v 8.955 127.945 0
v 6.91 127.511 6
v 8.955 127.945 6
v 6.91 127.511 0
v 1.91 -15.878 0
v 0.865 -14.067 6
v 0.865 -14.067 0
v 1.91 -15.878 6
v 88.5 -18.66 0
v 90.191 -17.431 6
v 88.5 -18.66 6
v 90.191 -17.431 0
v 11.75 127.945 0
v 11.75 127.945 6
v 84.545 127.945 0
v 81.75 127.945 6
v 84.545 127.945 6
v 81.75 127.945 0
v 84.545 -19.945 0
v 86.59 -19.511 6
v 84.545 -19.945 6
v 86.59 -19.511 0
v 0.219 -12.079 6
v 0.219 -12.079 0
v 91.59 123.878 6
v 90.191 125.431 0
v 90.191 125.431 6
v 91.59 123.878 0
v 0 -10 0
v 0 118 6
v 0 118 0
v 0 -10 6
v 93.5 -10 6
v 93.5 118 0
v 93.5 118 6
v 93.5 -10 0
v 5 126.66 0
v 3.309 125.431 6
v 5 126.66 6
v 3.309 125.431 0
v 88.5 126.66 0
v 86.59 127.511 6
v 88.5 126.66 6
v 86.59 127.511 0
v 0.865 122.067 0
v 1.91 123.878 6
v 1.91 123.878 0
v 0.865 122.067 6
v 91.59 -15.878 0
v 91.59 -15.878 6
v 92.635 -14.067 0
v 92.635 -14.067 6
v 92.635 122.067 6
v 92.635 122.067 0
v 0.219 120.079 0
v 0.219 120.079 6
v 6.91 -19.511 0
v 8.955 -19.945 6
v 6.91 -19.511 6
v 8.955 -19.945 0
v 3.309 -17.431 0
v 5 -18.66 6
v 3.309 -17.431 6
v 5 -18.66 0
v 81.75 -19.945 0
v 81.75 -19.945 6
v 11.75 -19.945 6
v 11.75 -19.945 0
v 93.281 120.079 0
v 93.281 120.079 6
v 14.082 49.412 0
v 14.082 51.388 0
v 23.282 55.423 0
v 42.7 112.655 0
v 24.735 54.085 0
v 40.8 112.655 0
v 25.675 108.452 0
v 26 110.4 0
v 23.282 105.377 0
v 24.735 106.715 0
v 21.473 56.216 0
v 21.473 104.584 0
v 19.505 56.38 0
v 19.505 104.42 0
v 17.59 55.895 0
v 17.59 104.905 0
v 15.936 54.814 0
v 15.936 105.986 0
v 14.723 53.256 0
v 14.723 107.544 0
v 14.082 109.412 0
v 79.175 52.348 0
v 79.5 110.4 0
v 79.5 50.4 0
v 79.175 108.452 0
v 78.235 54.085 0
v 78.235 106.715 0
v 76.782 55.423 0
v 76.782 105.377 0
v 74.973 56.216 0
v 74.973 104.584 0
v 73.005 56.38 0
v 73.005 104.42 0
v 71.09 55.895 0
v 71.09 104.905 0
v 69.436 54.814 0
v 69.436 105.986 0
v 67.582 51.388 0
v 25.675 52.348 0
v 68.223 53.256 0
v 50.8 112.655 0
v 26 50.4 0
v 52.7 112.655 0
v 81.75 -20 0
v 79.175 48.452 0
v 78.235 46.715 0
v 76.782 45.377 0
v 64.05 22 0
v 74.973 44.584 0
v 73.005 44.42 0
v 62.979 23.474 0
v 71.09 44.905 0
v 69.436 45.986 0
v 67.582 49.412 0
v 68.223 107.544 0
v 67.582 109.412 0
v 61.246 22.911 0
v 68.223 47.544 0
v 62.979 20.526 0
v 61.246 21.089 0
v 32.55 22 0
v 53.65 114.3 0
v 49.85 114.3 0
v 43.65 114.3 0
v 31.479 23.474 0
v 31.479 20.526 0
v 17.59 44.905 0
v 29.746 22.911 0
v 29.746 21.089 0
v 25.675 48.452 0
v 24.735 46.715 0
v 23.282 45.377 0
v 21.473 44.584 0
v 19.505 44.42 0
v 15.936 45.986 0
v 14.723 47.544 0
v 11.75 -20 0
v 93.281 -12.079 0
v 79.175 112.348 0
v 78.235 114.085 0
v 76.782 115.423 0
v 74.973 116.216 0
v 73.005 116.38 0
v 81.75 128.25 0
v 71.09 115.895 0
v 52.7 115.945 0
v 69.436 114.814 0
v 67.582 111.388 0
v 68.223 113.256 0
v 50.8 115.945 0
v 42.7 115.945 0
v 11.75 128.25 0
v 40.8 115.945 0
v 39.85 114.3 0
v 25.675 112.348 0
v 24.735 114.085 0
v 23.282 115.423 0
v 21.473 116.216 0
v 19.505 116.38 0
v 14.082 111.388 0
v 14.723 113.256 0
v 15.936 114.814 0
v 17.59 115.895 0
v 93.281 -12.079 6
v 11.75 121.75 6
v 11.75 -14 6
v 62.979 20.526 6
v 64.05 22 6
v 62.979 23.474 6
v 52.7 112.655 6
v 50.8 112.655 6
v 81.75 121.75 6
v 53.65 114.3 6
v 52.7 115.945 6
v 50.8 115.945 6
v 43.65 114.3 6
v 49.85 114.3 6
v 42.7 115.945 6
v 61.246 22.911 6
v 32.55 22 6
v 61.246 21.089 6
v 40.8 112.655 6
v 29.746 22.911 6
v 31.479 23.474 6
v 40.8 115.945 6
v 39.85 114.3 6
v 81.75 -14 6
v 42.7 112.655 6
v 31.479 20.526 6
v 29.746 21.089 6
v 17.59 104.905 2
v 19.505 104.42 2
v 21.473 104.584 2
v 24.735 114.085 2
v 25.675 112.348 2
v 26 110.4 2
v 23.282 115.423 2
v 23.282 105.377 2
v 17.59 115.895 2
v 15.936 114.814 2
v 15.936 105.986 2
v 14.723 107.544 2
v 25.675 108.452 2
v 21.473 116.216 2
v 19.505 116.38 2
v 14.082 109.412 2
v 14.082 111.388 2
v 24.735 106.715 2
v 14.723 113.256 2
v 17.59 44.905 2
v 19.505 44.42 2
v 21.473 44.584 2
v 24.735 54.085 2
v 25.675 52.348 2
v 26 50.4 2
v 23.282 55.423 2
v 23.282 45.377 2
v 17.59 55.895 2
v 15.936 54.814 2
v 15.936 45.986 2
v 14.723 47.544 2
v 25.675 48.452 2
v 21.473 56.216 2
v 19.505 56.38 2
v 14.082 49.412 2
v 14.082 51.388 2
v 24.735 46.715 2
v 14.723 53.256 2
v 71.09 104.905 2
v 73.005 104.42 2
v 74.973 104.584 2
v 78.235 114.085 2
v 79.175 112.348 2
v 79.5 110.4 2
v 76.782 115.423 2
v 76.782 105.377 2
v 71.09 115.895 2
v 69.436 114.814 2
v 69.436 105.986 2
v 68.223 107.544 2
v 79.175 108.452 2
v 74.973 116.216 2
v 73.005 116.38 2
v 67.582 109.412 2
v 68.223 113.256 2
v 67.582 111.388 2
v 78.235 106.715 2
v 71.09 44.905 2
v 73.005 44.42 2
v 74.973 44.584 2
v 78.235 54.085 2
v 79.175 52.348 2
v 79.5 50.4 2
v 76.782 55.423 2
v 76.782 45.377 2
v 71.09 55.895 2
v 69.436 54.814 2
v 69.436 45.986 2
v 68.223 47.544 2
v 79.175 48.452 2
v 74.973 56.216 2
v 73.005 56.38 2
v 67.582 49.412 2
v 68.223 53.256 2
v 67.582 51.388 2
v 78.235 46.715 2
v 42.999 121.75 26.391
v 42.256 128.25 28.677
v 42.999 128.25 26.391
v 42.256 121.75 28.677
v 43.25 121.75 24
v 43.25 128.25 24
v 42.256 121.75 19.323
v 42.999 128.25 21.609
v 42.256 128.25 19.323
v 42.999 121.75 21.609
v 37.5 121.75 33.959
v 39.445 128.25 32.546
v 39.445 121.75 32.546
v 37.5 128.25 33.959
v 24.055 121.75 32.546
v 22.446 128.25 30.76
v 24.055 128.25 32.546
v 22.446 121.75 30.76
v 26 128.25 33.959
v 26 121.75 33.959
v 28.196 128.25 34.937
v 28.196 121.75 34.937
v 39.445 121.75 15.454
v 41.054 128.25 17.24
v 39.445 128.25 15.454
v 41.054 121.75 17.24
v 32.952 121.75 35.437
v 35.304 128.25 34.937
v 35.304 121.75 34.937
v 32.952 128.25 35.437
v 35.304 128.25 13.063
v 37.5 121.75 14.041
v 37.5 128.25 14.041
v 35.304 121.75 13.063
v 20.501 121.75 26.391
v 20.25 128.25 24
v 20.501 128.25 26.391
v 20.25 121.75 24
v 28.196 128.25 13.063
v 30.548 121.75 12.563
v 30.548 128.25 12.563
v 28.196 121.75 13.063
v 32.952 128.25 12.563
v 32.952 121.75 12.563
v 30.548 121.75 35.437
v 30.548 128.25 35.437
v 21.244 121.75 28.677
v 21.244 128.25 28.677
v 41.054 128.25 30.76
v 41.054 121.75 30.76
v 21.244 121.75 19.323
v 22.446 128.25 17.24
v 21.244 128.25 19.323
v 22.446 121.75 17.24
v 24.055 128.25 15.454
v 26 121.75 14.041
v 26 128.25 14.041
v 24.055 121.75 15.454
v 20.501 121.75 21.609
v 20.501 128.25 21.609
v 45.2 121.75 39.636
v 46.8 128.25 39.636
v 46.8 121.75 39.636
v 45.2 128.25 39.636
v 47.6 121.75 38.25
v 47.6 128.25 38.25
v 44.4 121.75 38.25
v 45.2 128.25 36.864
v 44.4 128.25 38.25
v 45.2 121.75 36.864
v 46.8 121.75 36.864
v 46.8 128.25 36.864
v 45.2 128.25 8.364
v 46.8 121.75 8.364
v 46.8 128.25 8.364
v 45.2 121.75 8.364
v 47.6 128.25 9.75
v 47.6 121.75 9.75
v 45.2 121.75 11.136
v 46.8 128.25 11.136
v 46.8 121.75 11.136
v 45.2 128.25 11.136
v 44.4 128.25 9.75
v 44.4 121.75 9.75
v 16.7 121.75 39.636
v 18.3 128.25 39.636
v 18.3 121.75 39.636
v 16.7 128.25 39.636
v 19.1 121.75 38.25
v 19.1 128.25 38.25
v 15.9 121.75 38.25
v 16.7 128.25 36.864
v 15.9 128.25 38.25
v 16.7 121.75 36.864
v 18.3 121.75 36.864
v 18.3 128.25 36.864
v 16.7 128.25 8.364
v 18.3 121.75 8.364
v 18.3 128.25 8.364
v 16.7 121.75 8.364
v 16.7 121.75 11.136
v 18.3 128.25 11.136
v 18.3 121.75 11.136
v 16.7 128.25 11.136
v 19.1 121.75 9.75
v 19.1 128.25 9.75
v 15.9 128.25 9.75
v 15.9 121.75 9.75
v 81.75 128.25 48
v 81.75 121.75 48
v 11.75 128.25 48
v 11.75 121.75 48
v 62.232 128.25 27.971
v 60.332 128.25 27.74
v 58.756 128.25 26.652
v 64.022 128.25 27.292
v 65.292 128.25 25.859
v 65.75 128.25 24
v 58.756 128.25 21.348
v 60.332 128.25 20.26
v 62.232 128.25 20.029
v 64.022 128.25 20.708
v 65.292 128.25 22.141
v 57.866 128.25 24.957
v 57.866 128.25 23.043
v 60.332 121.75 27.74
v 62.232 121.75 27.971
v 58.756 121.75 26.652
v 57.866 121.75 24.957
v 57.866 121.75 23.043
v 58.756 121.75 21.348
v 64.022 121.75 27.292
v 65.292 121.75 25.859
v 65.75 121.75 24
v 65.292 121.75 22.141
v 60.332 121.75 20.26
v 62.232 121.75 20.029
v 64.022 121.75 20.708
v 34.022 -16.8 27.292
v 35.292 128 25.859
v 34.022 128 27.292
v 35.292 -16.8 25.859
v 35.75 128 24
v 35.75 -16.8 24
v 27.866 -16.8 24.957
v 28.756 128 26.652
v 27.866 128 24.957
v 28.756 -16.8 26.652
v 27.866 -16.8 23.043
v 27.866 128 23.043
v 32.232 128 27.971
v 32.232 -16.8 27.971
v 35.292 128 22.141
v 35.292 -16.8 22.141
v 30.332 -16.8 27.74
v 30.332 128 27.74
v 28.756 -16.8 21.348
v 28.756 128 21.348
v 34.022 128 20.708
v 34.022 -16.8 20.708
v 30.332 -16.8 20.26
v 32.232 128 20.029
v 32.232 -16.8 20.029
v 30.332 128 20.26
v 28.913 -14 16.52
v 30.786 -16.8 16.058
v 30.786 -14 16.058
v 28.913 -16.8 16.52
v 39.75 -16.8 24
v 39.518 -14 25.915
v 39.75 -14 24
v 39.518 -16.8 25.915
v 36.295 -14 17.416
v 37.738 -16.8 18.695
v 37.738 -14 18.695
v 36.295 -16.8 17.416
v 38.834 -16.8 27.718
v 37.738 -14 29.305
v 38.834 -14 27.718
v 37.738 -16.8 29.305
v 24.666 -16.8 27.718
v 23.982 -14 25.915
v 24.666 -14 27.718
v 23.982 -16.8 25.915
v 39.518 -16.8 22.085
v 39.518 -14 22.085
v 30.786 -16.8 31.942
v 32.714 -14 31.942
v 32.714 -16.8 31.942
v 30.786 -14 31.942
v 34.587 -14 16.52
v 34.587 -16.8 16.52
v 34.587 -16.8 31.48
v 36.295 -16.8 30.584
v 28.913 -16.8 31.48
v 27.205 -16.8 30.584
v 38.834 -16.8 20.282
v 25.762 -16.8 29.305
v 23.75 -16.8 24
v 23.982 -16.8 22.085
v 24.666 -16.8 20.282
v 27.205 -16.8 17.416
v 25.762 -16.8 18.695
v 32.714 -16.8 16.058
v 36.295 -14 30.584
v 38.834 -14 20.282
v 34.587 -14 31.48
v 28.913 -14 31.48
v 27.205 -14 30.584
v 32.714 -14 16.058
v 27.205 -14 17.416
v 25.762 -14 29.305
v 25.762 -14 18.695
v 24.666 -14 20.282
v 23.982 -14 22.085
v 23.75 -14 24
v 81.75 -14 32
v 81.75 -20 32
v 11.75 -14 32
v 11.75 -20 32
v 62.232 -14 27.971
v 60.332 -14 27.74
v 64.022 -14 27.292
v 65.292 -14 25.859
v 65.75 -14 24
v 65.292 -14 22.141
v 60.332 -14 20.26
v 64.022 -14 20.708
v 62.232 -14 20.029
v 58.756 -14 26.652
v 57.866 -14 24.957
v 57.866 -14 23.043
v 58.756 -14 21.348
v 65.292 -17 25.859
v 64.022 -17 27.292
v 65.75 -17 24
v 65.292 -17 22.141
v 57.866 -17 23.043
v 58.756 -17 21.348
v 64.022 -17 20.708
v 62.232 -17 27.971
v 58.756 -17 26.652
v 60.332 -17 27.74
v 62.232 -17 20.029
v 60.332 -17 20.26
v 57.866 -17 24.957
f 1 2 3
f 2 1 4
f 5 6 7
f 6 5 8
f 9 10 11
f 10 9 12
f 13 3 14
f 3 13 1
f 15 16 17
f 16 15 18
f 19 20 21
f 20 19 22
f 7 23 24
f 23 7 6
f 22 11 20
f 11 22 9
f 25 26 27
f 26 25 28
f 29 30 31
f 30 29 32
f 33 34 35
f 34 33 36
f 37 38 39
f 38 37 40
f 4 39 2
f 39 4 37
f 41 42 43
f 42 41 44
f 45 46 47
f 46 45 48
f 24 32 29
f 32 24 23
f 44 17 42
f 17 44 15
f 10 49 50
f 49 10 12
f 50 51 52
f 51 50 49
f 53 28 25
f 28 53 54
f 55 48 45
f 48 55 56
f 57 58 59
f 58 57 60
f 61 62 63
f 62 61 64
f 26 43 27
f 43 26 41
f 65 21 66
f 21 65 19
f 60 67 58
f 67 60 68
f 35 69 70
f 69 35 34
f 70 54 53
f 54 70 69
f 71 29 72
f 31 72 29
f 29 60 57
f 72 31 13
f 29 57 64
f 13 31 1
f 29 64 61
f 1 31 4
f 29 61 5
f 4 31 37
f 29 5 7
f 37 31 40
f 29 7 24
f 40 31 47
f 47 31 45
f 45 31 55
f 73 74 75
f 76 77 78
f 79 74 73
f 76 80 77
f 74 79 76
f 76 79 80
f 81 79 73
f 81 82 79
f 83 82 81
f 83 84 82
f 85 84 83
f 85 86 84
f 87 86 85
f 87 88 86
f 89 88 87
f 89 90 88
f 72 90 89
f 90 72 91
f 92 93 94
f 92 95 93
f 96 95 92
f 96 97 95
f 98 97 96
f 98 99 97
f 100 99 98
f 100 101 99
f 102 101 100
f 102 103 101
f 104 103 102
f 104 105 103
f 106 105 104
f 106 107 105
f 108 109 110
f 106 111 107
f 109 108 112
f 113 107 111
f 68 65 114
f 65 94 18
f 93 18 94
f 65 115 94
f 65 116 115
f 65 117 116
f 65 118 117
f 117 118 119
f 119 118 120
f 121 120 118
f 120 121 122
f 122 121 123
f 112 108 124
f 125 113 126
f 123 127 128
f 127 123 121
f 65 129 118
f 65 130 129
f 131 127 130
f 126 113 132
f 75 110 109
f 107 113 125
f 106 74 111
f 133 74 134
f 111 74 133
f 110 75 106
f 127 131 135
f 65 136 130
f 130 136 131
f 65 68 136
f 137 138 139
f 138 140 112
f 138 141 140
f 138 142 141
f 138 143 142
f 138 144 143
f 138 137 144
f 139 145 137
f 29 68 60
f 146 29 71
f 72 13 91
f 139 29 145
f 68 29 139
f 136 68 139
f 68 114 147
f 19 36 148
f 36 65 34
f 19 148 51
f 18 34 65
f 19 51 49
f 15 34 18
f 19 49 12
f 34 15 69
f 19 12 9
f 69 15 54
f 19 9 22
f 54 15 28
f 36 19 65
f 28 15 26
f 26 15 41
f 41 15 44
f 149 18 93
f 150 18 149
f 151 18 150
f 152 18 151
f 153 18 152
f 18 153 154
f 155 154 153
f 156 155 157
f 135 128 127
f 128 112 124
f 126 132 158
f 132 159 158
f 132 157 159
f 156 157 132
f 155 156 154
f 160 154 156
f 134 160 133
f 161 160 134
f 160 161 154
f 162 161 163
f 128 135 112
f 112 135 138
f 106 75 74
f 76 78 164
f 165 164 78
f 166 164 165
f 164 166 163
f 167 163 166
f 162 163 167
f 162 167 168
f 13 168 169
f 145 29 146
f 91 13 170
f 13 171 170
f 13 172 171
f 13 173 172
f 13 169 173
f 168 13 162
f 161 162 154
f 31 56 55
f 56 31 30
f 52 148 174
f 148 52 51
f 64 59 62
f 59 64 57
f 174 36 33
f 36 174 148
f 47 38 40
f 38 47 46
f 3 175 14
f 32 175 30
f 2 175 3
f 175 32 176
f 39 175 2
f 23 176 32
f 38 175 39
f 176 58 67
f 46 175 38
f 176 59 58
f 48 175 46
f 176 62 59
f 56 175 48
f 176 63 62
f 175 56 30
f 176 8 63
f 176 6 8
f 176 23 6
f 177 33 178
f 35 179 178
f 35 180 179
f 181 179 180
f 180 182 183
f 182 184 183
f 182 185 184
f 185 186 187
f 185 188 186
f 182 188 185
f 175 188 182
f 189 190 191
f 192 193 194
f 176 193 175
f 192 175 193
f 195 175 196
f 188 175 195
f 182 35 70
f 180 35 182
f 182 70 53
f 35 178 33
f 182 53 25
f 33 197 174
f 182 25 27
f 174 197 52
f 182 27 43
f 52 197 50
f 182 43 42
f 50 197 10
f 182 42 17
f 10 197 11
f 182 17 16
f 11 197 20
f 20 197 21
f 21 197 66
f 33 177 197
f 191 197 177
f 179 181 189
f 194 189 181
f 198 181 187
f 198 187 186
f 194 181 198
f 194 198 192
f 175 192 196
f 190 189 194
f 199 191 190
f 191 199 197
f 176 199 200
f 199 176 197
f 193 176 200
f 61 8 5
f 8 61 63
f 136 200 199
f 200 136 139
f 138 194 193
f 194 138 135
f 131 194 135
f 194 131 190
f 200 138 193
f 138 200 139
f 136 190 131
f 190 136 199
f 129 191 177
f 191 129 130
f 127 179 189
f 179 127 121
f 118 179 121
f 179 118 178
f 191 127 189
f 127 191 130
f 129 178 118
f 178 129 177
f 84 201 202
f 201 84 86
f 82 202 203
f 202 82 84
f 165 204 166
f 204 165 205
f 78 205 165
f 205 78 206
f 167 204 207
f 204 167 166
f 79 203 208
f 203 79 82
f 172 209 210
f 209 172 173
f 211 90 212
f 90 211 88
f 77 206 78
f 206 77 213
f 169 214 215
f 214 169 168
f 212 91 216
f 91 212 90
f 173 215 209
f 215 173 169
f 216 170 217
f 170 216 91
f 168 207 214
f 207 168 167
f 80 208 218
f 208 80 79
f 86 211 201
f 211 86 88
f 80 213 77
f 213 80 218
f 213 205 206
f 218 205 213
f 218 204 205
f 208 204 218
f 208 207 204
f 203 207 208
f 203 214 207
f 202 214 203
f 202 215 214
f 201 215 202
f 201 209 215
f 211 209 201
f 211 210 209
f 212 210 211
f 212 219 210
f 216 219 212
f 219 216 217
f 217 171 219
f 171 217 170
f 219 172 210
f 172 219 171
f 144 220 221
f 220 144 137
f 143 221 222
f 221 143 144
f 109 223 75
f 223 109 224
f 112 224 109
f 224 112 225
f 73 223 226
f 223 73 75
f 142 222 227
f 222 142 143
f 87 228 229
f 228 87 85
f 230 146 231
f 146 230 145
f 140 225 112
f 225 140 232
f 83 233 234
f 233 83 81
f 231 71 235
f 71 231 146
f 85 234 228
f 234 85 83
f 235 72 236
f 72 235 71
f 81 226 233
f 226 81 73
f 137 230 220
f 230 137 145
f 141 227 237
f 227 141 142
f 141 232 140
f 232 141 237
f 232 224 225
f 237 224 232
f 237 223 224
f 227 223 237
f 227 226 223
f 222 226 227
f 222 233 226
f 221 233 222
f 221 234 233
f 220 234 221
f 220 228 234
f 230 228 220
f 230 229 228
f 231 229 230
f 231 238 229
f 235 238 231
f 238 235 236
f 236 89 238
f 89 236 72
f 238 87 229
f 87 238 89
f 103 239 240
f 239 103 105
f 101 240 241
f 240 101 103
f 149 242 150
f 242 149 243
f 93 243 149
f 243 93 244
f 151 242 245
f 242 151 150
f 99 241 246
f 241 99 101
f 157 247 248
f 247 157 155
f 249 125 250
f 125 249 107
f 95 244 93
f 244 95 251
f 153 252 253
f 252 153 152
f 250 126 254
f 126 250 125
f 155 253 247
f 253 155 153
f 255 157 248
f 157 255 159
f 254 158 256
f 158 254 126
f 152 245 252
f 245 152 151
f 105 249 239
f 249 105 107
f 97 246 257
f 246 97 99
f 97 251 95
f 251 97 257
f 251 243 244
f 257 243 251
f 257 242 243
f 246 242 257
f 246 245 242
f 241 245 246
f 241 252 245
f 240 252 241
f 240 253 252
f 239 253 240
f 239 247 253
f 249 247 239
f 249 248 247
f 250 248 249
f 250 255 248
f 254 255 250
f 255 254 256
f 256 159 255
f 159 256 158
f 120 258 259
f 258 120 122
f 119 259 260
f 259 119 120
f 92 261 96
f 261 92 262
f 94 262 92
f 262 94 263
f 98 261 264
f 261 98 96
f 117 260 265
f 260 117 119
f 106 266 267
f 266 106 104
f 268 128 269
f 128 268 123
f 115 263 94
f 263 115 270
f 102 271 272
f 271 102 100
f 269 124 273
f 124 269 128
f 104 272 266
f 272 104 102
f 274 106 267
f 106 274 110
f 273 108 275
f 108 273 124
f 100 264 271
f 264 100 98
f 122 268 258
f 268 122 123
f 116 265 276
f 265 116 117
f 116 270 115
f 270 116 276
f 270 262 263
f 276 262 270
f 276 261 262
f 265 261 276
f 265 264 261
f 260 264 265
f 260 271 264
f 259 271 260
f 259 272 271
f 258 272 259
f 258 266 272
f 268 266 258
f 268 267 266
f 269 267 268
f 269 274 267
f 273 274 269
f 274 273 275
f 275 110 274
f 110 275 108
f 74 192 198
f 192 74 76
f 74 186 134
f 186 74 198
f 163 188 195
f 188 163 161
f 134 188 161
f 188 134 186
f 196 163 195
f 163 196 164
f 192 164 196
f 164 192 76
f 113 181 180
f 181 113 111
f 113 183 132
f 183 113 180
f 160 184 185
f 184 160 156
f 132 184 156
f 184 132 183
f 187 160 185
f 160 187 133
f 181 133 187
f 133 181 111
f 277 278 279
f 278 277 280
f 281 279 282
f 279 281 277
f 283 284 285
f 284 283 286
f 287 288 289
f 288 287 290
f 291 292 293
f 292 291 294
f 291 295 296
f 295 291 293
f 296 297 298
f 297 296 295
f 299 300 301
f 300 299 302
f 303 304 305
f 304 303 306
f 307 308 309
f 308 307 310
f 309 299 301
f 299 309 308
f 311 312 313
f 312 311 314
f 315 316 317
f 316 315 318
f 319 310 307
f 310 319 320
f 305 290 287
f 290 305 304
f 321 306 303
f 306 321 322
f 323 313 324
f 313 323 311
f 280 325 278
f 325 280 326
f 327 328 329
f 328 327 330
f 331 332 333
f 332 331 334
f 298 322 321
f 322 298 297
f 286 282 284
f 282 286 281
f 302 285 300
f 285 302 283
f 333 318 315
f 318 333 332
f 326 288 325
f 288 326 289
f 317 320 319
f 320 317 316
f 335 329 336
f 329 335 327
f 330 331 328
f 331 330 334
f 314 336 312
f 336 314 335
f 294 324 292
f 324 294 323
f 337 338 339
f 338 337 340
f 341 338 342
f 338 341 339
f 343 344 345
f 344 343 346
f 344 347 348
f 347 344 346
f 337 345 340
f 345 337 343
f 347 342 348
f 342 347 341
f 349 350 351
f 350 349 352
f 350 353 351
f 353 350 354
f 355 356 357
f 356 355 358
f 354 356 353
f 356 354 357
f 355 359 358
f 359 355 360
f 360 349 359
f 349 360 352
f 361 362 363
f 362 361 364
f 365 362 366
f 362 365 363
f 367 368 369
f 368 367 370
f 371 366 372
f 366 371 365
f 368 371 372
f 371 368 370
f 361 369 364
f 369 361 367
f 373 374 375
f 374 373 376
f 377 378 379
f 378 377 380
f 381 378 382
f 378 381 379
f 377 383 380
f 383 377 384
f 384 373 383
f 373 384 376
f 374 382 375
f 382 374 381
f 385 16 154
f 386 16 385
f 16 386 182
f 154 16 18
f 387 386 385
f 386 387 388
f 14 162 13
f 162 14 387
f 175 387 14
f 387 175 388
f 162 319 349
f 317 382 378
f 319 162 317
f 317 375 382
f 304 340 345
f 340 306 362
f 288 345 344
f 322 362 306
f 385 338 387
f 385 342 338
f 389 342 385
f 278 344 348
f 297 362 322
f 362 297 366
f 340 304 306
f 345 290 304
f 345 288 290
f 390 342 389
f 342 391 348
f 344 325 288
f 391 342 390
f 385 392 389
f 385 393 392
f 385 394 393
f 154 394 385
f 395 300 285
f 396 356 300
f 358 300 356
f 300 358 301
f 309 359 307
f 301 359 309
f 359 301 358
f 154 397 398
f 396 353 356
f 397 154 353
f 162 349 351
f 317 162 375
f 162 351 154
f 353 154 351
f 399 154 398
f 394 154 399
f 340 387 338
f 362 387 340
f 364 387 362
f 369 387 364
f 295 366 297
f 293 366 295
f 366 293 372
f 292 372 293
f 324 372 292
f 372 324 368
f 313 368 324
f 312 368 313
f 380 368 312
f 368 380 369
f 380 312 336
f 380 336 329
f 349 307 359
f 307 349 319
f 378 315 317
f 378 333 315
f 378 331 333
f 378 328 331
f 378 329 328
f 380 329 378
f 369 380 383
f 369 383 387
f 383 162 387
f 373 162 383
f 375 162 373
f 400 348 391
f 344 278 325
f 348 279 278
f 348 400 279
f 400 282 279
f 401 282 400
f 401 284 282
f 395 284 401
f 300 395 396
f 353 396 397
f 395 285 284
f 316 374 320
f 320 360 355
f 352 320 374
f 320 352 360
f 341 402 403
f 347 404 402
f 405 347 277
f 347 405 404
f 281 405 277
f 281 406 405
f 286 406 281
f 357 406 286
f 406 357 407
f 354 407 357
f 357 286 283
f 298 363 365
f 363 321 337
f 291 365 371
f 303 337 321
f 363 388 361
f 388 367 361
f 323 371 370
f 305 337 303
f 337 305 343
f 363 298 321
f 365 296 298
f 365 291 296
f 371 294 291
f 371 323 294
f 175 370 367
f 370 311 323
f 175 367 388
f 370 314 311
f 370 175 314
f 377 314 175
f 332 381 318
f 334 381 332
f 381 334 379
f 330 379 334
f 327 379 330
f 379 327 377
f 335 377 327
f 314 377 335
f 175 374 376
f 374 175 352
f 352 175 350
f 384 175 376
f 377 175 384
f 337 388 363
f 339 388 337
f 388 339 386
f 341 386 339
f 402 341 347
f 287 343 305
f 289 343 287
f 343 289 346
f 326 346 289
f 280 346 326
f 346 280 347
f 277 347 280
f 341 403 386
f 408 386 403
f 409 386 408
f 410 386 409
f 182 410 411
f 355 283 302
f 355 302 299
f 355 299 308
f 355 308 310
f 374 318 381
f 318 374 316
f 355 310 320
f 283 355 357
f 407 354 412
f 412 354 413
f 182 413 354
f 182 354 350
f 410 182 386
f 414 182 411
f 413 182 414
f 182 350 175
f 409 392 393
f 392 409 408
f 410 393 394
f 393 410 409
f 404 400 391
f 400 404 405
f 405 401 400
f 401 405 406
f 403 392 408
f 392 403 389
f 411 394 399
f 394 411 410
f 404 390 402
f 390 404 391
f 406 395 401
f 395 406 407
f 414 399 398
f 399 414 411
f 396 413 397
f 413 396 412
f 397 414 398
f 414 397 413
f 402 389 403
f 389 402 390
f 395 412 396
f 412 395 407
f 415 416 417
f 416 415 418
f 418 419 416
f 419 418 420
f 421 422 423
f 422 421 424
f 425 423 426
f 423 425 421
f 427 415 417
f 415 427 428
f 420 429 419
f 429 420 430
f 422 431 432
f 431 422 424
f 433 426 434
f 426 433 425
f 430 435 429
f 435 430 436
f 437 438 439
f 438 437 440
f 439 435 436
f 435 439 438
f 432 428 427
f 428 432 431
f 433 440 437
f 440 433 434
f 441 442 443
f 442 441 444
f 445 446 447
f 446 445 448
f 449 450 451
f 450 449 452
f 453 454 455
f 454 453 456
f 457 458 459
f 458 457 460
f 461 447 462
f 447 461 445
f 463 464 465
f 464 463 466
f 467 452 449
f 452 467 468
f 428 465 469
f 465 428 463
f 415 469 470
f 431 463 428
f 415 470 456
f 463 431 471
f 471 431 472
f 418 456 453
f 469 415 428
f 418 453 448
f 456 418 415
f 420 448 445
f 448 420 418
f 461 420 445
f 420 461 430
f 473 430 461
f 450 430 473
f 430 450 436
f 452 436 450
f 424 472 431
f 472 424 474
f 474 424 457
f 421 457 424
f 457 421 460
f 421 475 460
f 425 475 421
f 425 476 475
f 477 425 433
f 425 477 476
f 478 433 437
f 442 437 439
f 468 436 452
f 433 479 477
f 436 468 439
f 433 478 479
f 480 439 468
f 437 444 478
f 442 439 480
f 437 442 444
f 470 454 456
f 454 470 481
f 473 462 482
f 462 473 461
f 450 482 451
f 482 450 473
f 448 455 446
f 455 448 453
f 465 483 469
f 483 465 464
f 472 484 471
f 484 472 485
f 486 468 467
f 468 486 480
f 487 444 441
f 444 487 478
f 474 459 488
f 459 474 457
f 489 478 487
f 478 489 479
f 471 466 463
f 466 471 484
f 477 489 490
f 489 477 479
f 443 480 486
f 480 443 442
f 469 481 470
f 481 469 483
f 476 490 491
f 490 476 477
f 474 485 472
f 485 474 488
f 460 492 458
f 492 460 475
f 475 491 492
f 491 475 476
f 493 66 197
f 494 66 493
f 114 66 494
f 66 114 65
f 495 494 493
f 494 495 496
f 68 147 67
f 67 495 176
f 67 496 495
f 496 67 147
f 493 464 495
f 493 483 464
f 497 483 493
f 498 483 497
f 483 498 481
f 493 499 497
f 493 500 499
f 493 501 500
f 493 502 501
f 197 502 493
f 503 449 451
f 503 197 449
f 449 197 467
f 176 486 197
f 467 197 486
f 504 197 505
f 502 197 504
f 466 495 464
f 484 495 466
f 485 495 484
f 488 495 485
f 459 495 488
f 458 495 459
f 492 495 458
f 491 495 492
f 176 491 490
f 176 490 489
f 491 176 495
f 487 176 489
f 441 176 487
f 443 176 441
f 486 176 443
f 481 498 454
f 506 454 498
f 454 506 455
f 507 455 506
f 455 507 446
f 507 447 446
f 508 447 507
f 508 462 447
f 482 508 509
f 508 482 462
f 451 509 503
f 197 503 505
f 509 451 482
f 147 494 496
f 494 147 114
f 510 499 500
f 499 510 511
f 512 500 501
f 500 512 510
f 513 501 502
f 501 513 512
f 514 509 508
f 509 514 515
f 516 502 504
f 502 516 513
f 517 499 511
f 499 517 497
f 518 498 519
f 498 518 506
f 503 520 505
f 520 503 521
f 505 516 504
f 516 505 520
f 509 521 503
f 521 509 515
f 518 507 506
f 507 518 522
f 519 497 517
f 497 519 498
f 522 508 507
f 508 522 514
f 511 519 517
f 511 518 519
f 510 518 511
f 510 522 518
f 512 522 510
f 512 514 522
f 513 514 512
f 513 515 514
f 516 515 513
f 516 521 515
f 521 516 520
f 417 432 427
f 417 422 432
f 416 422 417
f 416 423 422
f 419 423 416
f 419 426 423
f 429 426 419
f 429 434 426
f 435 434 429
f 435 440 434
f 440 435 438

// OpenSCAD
module roundedcube(x,y,z,r){
 hull(){
  translate([r/2,r/2,0]) cylinder(h=z,d=r);
  translate([-(r/2)+x,r/2,0]) cylinder(h=z,d=r);
  translate([(r/2),-(r/2)+y,0]) cylinder(h=z,d=r);
  translate([-(r/2)+x,-(r/2)+y,0]) cylinder(h=z,d=r);
 }
}

difference(){
translate([0,-20,0])
roundedcube(93.5, 142+6, 6, 20);

translate([29.5+1.5,20.5+1.5,-1])
cylinder(r=1.55,h=10);
translate([93.5-(29.5+1.5),20.5+1.5,-1])
cylinder(r=1.55,h=10);

translate([24.5-4.5,122-(16.1-4.5),-1])
cylinder(r=6,h=3);
translate([24.5-4.5,122-(76.1-4.5),-1])
cylinder(r=6,h=3);
translate([93.5-(24.5-4.5),122-(16.1-4.5),-1])
cylinder(r=6,h=3);
translate([93.5-(24.5-4.5),122-(76.1-4.5),-1])
cylinder(r=6,h=3);

translate([93.5/2-(3.1+1.9),122-(9.6-1.9),-1])
cylinder(r=1.9,h=10);
translate([93.5/2+(3.1+1.9),122-(9.6-1.9),-1])
cylinder(r=1.9,h=10);
}

translate([93.5/2, 122+3, 24]) {
difference(){
cube([70, 6.5, 48], center=true);
translate([-15,0,0]){
translate([0,8,0])
rotate([90,0,0])
cylinder(r=23/2,h=16);
translate([14.25,8,14.25])
rotate([90,0,0])
cylinder(r=1.6,h=16);
translate([14.25,8,-14.25])
rotate([90,0,0])
cylinder(r=1.6,h=16);
translate([-14.25,8,14.25])
rotate([90,0,0])
cylinder(r=1.6,h=16);
translate([-14.25,8,-14.25])
rotate([90,0,0])
cylinder(r=1.6,h=16);
}
translate([15, 8, 0])
rotate([90,0,0])
cylinder(r=4,h=16);
}}

difference(){
translate([93.5/2, -20+3, 16])
cube([70, 6, 32], center=true);
translate([-15,0,0]){
translate([93.5/2, -20+3, 24])
translate([0,8,0])
rotate([90,0,0])
cylinder(r=4,h=16);
translate([93.5/2, -20+3, 24])
translate([0,3.2,0])
rotate([90,0,0])
cylinder(r=8,h=3);
}
translate([15,0,0]){
translate([93.5/2, -20+3, 24])
translate([0,8,0])
rotate([90,0,0])
cylinder(r=4,h=8);
}}

color("blue")
translate([93.5/2-15, 128, 24])
rotate([90,0,0])
cylinder(r=4,h=148);
/*
color("blue")
translate([93.5/2+15, 128, 24])
rotate([90,0,0])
cylinder(r=4,h=148);
/*
difference(){
hull(){
translate([10,-10,5]) cylinder(r=10,h=43);
translate([10,118,5]) cylinder(r=10,h=43);
}
translate([20-4.5,-20,42])
rotate([0,45,0])
cube([6.4,120,6.4]);
}
difference(){
hull(){
translate([93.5-10,-10,5]) cylinder(r=10,h=43);
translate([93.5-10,118,5]) cylinder(r=10,h=43);
}
translate([93.5-20-4.5,-20,42])
rotate([0,45,0])
cube([6.4,120,6.4]);
}
*/
